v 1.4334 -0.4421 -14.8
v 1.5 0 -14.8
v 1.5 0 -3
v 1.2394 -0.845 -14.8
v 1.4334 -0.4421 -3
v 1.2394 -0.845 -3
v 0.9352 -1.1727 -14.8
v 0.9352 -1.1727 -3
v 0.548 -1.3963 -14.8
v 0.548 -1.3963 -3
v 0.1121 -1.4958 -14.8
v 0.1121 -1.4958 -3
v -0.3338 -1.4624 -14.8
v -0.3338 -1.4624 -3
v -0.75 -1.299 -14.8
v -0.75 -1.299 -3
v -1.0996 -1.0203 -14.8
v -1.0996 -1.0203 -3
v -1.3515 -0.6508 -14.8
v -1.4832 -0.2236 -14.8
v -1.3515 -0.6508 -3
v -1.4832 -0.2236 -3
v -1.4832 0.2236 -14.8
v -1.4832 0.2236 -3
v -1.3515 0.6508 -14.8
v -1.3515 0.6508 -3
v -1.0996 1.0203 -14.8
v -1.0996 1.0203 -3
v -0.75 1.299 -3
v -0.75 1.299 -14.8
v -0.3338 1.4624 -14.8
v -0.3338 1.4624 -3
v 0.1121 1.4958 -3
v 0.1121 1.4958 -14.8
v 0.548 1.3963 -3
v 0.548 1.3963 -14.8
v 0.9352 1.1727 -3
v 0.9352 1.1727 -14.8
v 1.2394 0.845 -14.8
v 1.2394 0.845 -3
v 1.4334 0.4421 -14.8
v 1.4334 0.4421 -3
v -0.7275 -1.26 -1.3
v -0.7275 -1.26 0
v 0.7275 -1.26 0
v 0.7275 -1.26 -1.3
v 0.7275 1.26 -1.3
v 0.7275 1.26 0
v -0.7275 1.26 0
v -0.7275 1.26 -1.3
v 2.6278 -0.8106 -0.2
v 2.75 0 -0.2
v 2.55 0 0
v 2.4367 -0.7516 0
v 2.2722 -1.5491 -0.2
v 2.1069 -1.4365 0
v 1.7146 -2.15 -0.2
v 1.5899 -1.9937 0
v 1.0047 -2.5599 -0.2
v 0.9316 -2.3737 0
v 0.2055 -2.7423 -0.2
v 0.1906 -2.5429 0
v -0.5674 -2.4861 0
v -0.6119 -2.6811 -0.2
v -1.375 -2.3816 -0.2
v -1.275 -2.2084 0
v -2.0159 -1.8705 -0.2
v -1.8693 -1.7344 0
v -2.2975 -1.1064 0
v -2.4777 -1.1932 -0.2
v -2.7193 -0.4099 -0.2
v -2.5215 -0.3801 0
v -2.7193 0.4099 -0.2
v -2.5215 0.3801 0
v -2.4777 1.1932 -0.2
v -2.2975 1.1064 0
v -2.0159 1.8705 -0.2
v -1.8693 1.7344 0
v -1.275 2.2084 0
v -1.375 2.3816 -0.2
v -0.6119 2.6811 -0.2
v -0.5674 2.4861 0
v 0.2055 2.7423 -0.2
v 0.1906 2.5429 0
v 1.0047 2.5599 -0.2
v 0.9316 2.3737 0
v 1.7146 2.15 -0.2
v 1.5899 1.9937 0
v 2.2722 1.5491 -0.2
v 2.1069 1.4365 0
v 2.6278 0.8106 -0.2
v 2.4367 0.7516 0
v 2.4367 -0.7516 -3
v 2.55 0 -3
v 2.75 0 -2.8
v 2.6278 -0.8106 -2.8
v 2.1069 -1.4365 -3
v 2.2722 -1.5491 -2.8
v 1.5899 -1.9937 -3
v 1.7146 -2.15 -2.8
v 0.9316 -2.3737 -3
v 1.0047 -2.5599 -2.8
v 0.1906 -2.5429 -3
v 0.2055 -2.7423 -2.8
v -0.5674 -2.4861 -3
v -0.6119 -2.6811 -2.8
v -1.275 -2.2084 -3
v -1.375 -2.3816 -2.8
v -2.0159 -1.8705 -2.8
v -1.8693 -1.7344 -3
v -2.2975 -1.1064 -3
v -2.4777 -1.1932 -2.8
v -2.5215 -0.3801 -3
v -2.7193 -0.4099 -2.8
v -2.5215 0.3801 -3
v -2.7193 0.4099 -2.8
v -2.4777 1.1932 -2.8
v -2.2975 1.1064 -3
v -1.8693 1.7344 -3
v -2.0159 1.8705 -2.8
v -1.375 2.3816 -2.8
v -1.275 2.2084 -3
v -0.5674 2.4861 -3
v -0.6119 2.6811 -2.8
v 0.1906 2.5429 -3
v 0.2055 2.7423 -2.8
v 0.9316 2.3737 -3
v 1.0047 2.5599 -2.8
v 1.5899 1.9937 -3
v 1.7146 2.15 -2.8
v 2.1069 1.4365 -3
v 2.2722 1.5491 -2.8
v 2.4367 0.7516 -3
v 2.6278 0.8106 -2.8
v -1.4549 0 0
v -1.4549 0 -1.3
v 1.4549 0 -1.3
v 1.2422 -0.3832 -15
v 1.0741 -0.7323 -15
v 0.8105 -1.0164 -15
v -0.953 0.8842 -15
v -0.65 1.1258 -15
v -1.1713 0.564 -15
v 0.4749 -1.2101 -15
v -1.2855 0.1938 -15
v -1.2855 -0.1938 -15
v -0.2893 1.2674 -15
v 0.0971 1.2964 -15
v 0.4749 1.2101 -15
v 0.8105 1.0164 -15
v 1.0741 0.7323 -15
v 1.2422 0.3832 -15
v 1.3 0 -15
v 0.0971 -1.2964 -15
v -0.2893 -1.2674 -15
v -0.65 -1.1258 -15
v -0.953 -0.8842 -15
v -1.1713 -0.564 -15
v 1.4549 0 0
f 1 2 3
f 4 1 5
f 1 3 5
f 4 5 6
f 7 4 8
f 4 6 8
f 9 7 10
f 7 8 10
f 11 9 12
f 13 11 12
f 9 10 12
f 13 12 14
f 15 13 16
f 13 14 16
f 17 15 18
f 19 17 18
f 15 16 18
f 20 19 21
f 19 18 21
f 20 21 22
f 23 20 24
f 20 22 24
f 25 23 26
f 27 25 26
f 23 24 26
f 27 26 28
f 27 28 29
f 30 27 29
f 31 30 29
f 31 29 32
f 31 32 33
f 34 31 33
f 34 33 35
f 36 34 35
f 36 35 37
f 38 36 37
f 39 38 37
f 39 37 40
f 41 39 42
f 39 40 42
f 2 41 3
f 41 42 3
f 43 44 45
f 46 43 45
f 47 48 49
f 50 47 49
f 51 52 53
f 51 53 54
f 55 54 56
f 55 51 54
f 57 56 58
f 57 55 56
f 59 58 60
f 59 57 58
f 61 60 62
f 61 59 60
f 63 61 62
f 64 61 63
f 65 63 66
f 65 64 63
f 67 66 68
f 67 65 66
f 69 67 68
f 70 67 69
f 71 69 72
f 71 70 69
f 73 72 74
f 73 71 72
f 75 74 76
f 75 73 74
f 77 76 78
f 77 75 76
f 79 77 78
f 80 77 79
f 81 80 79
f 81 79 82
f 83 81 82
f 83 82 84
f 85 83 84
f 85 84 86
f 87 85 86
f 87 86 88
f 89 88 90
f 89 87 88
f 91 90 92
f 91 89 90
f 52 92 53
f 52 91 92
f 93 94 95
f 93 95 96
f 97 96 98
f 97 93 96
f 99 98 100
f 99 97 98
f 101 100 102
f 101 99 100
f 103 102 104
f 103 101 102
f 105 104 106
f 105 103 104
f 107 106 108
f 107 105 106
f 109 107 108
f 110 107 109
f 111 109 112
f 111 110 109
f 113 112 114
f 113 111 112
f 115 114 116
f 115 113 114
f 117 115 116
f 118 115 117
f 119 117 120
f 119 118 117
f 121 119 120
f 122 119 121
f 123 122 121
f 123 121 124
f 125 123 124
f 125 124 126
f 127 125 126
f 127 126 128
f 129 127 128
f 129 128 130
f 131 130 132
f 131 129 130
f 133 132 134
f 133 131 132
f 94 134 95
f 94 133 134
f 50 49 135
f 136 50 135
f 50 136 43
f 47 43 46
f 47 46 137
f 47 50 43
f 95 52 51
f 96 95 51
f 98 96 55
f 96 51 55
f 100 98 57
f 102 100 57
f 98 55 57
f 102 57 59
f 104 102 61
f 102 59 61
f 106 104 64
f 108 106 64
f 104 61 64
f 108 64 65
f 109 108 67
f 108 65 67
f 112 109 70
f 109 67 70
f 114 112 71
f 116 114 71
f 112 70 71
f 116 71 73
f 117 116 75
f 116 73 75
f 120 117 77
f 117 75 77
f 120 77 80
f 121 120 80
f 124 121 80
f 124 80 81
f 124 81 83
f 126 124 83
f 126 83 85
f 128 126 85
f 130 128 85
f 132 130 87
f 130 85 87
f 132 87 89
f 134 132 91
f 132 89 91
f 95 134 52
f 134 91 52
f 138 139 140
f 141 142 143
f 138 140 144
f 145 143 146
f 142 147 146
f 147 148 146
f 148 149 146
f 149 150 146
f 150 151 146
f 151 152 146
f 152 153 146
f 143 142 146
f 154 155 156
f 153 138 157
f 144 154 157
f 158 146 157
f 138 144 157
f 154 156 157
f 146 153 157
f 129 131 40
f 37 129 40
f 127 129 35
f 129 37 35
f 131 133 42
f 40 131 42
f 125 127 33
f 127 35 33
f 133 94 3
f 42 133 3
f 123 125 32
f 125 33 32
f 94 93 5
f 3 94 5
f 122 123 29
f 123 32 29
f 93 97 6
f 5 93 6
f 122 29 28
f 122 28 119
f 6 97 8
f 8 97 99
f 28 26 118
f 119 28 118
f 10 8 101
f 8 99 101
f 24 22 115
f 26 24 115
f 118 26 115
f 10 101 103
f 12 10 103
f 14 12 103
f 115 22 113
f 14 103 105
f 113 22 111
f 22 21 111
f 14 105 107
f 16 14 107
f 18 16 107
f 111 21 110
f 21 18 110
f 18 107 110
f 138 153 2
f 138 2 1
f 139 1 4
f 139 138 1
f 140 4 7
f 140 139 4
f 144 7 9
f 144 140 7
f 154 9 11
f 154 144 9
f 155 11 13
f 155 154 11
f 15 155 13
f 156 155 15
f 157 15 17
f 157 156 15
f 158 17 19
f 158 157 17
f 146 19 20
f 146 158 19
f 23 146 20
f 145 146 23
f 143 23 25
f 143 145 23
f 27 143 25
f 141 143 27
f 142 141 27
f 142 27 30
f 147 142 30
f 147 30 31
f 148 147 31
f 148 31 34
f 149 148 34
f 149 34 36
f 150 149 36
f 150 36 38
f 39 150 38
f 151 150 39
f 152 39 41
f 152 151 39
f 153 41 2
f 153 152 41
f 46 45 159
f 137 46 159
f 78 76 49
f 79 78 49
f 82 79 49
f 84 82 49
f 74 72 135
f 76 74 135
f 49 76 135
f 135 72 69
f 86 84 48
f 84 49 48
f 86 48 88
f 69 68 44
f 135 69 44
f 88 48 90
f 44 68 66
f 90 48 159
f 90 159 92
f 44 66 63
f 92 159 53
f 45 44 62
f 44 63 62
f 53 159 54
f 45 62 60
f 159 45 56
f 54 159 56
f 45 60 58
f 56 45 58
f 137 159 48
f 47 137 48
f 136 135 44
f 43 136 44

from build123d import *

# Parameters (mm, degrees)
F3_DEPTH = 1.3
F4_SIZE  = 0.2


with BuildPart() as f1:
    # F0 (on Front) → F1 (revolve)
    with BuildSketch(Plane.XZ):
        Polygon((2.75, 0), (0, 0), (0, -15), (1.5, -15), (1.5, -3), (2.75, -3), align=None)
    revolve(axis=Axis((0, 0, -7.5), (0, 0, -1)))

    # F2 (on face) → F3 (cut)
    with BuildSketch(Plane.XY):
        Polygon((-1.454923, 0), (-0.727461, -1.26), (0.727461, -1.26), (1.454923, 0), (0.727461, 1.26), (-0.727461, 1.26), align=None)
    extrude(amount=-F3_DEPTH, mode=Mode.SUBTRACT)

    # F4
    f4_edges = [f1.edges().sort_by_distance(p)[0] for p in [
        (-2.75, 0, -3),
        (-2.75, 0, 0),
        (2.75, 0, -1.5),
        (-1.5, 0, -15),
    ]]
    chamfer(f4_edges, length=F4_SIZE)


solid = f1.part
